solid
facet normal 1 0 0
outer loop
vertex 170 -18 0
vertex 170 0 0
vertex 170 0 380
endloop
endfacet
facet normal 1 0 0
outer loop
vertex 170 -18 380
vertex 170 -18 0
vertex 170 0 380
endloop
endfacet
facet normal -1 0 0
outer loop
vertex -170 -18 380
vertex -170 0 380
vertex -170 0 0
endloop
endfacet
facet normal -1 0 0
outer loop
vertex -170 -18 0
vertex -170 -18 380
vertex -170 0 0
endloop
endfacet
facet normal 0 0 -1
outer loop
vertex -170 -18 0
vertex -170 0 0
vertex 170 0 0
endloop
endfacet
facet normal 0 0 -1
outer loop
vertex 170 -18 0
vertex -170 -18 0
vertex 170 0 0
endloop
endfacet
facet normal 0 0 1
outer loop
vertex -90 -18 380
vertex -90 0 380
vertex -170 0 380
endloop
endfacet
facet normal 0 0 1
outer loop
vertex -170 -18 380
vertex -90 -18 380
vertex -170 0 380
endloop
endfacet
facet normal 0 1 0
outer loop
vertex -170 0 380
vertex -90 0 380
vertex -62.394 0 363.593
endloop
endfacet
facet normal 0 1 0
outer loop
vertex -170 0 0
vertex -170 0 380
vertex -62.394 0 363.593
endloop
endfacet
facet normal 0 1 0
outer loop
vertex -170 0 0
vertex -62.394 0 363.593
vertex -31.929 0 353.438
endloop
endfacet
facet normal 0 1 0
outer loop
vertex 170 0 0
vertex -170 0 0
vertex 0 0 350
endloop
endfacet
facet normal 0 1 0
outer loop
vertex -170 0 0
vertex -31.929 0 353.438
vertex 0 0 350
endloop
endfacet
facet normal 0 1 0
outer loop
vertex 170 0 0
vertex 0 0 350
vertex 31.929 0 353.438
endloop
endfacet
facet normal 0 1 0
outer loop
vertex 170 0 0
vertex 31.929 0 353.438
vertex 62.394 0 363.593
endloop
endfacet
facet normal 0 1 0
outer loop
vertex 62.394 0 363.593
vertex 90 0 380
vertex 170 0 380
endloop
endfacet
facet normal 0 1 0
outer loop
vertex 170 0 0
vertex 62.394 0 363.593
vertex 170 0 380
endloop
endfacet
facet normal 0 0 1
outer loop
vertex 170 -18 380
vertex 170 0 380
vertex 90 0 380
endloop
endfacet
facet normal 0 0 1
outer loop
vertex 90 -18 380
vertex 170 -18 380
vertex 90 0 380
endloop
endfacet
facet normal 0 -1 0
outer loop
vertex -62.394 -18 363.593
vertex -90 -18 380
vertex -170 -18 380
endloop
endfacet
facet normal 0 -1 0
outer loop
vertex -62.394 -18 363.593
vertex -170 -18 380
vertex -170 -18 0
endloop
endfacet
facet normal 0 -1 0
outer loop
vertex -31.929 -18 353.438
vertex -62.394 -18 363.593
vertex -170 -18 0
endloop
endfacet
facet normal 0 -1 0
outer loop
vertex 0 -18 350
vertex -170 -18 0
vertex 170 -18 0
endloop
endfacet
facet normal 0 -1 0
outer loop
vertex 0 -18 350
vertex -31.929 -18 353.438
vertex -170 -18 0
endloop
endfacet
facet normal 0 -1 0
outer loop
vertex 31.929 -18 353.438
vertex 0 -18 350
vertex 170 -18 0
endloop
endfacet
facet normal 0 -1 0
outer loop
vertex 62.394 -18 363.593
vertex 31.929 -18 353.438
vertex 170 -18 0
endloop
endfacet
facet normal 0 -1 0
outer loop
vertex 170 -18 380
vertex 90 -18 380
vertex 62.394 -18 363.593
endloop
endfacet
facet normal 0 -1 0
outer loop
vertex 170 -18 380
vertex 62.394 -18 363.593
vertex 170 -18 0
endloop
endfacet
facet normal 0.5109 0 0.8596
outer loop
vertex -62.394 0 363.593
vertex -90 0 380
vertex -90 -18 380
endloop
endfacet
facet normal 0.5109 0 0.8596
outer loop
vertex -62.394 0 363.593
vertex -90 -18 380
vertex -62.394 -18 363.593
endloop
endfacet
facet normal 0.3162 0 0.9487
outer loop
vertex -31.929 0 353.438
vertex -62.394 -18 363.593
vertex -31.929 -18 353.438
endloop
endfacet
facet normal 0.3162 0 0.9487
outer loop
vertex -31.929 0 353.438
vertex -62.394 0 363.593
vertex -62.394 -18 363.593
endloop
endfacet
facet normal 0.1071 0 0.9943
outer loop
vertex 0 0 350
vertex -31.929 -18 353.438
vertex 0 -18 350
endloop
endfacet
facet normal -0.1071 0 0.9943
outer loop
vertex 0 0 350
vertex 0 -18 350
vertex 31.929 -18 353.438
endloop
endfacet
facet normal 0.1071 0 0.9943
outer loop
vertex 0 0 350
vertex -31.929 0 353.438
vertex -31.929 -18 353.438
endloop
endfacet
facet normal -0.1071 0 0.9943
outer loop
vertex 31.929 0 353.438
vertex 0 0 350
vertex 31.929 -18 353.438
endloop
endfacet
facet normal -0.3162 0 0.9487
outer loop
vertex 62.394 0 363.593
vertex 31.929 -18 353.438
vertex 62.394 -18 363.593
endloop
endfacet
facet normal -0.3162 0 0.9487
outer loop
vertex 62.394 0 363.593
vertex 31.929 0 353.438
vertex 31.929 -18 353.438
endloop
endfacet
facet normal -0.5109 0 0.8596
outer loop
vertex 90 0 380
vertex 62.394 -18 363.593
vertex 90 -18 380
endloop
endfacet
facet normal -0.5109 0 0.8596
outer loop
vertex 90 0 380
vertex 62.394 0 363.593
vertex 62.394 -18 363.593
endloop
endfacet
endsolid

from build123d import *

# Parameters (mm, degrees)
PAD_DEPTH = 18


with BuildPart() as part:
    # Sketch → Pad (new body)
    with BuildSketch(Plane.XZ):
        with BuildLine():
            Line((-170, 0), (170, 0))
            Line((170, 0), (170, 380))
            Line((170, 380), (90, 380))
            ThreePointArc((-90, 380), (0, 350), (90, 380))
            Line((-90, 380), (-170, 380))
            Line((-170, 380), (-170, 0))
        make_face()
    extrude(amount=PAD_DEPTH)


solid = part.part
